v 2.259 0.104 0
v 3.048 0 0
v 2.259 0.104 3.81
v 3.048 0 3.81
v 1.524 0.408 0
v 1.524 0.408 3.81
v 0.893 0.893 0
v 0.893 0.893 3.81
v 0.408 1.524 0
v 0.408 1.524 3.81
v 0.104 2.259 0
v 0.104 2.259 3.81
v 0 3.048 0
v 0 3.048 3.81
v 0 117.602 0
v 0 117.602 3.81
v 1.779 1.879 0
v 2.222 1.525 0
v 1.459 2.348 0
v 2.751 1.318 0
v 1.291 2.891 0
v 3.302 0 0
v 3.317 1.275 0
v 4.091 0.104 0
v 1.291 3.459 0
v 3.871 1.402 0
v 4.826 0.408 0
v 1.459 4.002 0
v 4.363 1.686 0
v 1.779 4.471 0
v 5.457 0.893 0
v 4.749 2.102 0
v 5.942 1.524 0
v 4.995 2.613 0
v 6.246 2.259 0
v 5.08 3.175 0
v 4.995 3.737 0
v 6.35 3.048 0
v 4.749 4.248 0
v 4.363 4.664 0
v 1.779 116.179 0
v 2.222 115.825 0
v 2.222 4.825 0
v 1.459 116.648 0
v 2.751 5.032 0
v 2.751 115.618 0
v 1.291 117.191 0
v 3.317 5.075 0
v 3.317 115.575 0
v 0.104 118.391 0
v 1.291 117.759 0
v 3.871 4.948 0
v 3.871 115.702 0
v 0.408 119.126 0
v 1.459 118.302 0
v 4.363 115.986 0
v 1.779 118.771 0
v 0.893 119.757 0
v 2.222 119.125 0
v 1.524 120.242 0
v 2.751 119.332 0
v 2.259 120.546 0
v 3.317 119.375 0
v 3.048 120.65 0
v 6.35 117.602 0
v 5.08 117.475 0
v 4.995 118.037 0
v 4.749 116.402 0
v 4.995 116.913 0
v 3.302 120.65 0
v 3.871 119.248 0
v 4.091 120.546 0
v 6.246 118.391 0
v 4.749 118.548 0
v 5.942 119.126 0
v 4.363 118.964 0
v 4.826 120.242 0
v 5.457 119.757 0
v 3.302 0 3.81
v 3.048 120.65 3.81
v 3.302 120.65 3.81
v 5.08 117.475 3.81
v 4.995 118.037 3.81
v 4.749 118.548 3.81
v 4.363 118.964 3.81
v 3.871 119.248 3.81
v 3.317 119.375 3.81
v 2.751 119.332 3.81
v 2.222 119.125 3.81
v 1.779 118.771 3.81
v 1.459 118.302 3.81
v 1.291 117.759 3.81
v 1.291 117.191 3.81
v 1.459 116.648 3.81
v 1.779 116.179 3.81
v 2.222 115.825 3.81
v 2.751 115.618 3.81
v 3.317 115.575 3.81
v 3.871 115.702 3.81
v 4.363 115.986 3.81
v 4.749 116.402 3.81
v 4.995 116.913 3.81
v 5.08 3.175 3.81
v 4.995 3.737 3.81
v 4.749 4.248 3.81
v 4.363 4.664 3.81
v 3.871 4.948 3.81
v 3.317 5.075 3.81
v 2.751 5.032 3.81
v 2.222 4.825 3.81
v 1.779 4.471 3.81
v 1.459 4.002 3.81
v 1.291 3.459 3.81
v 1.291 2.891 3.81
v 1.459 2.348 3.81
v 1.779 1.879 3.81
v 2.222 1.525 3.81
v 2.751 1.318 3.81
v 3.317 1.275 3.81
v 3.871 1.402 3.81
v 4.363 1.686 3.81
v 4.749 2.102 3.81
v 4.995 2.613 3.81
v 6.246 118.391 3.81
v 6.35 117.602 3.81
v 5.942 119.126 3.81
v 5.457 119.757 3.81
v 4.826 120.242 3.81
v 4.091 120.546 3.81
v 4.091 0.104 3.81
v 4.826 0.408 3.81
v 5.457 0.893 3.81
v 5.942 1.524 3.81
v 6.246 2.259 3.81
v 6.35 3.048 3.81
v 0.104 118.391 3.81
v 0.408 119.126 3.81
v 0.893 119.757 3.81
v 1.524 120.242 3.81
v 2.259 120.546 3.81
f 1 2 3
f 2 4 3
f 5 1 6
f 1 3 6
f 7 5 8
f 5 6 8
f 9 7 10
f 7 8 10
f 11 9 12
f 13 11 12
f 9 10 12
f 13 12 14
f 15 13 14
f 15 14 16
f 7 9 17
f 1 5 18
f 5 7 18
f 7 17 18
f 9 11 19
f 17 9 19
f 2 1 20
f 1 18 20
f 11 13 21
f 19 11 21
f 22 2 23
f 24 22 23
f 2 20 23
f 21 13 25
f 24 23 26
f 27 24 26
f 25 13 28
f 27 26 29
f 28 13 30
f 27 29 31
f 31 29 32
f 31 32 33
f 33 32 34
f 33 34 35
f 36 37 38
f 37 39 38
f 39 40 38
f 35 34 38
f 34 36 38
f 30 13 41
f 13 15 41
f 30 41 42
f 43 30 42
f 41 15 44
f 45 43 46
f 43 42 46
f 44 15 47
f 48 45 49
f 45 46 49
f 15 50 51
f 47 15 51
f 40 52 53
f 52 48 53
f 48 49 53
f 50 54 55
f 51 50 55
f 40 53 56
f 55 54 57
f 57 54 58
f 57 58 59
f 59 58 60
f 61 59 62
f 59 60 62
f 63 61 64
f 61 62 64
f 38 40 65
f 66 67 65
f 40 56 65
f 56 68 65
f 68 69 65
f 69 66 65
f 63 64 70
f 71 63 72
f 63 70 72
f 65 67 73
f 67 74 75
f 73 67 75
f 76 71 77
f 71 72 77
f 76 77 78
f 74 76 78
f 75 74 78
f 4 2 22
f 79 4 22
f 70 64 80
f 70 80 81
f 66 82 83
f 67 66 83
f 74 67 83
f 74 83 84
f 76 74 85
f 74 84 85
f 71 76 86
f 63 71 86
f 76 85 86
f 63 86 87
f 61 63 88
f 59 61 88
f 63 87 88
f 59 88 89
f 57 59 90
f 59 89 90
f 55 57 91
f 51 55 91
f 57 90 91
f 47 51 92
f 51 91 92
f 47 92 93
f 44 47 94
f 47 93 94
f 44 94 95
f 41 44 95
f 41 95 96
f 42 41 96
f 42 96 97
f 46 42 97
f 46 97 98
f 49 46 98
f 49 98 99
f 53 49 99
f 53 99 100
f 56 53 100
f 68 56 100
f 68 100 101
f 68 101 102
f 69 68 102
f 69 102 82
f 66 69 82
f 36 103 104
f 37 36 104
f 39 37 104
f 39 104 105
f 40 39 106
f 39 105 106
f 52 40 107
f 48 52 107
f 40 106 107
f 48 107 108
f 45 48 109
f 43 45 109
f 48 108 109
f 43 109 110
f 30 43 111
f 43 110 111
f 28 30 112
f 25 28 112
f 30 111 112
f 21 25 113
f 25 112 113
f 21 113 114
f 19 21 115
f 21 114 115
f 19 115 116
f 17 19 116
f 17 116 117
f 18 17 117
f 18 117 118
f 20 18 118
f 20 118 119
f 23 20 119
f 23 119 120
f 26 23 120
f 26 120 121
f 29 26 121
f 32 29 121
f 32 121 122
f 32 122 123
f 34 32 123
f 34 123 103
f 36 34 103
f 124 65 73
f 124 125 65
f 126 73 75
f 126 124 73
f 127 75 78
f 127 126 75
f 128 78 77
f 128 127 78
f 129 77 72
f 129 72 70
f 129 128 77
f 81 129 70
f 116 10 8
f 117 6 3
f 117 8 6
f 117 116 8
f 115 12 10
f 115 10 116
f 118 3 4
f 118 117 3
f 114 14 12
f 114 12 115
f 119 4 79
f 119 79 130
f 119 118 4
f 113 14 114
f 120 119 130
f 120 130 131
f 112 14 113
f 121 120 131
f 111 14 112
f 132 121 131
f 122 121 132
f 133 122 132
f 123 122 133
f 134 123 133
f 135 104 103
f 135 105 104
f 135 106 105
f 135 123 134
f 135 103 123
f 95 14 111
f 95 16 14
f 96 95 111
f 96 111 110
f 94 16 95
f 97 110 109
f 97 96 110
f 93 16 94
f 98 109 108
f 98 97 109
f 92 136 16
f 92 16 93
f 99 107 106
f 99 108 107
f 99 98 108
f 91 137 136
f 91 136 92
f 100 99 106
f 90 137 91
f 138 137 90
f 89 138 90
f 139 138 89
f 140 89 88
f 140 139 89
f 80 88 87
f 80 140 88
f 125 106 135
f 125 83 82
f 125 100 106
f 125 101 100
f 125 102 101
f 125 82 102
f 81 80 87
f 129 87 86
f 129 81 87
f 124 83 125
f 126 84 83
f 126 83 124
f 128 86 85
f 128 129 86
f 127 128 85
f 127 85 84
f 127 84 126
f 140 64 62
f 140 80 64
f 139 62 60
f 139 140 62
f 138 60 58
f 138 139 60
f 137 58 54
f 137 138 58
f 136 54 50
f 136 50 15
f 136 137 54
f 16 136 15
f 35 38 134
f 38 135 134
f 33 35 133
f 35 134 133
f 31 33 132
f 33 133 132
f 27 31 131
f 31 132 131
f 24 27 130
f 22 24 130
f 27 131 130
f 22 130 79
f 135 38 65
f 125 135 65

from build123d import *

# Parameters (mm, degrees)
SKETCH2_W           = 6.35
SKETCH2_H           = 120.65
BOSS_EXTRUDE1_DEPTH = 3.81
EDGE_1_R            = 3.048
EDGE_2_R            = 3.048
EDGE_3_R            = 3.048
EDGE_4_R            = 3.048
SKETCH4_R           = 1.905
HOLES_DEPTH         = 121.877049517


with BuildPart() as part:
    # Sketch2 → Boss-Extrude1 (new body)
    with BuildSketch(Plane.XY):
        with Locations((3.175, 60.325)):
            Rectangle(SKETCH2_W, SKETCH2_H)
    extrude(amount=BOSS_EXTRUDE1_DEPTH)

    # Edge 1
    edge_1_edges = [part.edges().sort_by_distance(p)[0] for p in [
        (6.35, 120.65, 1.905),
    ]]
    fillet(edge_1_edges, radius=EDGE_1_R)

    # Edge 2
    edge_2_edges = [part.edges().sort_by_distance(p)[0] for p in [
        (0, 120.65, 1.905),
    ]]
    fillet(edge_2_edges, radius=EDGE_2_R)

    # Edge 3
    edge_3_edges = [part.edges().sort_by_distance(p)[0] for p in [
        (6.35, 0, 1.905),
    ]]
    fillet(edge_3_edges, radius=EDGE_3_R)

    # Edge 4
    edge_4_edges = [part.edges().sort_by_distance(p)[0] for p in [
        (0, 0, 1.905),
    ]]
    fillet(edge_4_edges, radius=EDGE_4_R)

    # Sketch4 → Holes (cut, through all)
    with BuildSketch(Plane.XY.offset(3.81)):
        with Locations((3.175, 3.175)):
            Circle(SKETCH4_R)
        with Locations((3.175, 117.475)):
            Circle(SKETCH4_R)
    extrude(amount=-HOLES_DEPTH, mode=Mode.SUBTRACT)


solid = part.part
